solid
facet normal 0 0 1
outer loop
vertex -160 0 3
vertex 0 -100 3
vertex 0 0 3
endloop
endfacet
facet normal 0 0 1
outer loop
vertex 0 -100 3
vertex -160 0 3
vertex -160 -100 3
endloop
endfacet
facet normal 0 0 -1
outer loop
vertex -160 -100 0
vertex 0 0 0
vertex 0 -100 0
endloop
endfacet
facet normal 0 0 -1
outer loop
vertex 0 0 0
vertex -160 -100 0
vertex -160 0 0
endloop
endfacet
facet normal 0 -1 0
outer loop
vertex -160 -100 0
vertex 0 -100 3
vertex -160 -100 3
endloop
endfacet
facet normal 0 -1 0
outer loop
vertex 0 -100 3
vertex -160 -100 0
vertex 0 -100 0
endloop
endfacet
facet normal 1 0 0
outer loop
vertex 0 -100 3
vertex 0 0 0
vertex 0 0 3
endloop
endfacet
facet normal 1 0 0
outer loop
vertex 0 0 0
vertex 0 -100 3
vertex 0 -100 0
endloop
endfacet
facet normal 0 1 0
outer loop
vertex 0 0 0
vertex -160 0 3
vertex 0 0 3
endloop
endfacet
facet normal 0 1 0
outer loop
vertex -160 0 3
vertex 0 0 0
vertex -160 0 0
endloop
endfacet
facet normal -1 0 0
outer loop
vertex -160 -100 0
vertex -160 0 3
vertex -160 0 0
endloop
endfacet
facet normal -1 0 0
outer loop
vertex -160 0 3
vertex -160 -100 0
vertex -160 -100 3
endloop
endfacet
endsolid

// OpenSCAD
// CSG file generated from FreeCAD Export 0.1c
group() {
 group(){
multmatrix([[1.0, 0.0, 0.0, -80.0], [0.0, 1.0, 0.0, -50.0], [0.0, 0.0, 1.0, 1.5], [ 0, 0, 0, 1]]){
cube (size = [160.0, 100.0, 3.0], center = true);
}
}
}
